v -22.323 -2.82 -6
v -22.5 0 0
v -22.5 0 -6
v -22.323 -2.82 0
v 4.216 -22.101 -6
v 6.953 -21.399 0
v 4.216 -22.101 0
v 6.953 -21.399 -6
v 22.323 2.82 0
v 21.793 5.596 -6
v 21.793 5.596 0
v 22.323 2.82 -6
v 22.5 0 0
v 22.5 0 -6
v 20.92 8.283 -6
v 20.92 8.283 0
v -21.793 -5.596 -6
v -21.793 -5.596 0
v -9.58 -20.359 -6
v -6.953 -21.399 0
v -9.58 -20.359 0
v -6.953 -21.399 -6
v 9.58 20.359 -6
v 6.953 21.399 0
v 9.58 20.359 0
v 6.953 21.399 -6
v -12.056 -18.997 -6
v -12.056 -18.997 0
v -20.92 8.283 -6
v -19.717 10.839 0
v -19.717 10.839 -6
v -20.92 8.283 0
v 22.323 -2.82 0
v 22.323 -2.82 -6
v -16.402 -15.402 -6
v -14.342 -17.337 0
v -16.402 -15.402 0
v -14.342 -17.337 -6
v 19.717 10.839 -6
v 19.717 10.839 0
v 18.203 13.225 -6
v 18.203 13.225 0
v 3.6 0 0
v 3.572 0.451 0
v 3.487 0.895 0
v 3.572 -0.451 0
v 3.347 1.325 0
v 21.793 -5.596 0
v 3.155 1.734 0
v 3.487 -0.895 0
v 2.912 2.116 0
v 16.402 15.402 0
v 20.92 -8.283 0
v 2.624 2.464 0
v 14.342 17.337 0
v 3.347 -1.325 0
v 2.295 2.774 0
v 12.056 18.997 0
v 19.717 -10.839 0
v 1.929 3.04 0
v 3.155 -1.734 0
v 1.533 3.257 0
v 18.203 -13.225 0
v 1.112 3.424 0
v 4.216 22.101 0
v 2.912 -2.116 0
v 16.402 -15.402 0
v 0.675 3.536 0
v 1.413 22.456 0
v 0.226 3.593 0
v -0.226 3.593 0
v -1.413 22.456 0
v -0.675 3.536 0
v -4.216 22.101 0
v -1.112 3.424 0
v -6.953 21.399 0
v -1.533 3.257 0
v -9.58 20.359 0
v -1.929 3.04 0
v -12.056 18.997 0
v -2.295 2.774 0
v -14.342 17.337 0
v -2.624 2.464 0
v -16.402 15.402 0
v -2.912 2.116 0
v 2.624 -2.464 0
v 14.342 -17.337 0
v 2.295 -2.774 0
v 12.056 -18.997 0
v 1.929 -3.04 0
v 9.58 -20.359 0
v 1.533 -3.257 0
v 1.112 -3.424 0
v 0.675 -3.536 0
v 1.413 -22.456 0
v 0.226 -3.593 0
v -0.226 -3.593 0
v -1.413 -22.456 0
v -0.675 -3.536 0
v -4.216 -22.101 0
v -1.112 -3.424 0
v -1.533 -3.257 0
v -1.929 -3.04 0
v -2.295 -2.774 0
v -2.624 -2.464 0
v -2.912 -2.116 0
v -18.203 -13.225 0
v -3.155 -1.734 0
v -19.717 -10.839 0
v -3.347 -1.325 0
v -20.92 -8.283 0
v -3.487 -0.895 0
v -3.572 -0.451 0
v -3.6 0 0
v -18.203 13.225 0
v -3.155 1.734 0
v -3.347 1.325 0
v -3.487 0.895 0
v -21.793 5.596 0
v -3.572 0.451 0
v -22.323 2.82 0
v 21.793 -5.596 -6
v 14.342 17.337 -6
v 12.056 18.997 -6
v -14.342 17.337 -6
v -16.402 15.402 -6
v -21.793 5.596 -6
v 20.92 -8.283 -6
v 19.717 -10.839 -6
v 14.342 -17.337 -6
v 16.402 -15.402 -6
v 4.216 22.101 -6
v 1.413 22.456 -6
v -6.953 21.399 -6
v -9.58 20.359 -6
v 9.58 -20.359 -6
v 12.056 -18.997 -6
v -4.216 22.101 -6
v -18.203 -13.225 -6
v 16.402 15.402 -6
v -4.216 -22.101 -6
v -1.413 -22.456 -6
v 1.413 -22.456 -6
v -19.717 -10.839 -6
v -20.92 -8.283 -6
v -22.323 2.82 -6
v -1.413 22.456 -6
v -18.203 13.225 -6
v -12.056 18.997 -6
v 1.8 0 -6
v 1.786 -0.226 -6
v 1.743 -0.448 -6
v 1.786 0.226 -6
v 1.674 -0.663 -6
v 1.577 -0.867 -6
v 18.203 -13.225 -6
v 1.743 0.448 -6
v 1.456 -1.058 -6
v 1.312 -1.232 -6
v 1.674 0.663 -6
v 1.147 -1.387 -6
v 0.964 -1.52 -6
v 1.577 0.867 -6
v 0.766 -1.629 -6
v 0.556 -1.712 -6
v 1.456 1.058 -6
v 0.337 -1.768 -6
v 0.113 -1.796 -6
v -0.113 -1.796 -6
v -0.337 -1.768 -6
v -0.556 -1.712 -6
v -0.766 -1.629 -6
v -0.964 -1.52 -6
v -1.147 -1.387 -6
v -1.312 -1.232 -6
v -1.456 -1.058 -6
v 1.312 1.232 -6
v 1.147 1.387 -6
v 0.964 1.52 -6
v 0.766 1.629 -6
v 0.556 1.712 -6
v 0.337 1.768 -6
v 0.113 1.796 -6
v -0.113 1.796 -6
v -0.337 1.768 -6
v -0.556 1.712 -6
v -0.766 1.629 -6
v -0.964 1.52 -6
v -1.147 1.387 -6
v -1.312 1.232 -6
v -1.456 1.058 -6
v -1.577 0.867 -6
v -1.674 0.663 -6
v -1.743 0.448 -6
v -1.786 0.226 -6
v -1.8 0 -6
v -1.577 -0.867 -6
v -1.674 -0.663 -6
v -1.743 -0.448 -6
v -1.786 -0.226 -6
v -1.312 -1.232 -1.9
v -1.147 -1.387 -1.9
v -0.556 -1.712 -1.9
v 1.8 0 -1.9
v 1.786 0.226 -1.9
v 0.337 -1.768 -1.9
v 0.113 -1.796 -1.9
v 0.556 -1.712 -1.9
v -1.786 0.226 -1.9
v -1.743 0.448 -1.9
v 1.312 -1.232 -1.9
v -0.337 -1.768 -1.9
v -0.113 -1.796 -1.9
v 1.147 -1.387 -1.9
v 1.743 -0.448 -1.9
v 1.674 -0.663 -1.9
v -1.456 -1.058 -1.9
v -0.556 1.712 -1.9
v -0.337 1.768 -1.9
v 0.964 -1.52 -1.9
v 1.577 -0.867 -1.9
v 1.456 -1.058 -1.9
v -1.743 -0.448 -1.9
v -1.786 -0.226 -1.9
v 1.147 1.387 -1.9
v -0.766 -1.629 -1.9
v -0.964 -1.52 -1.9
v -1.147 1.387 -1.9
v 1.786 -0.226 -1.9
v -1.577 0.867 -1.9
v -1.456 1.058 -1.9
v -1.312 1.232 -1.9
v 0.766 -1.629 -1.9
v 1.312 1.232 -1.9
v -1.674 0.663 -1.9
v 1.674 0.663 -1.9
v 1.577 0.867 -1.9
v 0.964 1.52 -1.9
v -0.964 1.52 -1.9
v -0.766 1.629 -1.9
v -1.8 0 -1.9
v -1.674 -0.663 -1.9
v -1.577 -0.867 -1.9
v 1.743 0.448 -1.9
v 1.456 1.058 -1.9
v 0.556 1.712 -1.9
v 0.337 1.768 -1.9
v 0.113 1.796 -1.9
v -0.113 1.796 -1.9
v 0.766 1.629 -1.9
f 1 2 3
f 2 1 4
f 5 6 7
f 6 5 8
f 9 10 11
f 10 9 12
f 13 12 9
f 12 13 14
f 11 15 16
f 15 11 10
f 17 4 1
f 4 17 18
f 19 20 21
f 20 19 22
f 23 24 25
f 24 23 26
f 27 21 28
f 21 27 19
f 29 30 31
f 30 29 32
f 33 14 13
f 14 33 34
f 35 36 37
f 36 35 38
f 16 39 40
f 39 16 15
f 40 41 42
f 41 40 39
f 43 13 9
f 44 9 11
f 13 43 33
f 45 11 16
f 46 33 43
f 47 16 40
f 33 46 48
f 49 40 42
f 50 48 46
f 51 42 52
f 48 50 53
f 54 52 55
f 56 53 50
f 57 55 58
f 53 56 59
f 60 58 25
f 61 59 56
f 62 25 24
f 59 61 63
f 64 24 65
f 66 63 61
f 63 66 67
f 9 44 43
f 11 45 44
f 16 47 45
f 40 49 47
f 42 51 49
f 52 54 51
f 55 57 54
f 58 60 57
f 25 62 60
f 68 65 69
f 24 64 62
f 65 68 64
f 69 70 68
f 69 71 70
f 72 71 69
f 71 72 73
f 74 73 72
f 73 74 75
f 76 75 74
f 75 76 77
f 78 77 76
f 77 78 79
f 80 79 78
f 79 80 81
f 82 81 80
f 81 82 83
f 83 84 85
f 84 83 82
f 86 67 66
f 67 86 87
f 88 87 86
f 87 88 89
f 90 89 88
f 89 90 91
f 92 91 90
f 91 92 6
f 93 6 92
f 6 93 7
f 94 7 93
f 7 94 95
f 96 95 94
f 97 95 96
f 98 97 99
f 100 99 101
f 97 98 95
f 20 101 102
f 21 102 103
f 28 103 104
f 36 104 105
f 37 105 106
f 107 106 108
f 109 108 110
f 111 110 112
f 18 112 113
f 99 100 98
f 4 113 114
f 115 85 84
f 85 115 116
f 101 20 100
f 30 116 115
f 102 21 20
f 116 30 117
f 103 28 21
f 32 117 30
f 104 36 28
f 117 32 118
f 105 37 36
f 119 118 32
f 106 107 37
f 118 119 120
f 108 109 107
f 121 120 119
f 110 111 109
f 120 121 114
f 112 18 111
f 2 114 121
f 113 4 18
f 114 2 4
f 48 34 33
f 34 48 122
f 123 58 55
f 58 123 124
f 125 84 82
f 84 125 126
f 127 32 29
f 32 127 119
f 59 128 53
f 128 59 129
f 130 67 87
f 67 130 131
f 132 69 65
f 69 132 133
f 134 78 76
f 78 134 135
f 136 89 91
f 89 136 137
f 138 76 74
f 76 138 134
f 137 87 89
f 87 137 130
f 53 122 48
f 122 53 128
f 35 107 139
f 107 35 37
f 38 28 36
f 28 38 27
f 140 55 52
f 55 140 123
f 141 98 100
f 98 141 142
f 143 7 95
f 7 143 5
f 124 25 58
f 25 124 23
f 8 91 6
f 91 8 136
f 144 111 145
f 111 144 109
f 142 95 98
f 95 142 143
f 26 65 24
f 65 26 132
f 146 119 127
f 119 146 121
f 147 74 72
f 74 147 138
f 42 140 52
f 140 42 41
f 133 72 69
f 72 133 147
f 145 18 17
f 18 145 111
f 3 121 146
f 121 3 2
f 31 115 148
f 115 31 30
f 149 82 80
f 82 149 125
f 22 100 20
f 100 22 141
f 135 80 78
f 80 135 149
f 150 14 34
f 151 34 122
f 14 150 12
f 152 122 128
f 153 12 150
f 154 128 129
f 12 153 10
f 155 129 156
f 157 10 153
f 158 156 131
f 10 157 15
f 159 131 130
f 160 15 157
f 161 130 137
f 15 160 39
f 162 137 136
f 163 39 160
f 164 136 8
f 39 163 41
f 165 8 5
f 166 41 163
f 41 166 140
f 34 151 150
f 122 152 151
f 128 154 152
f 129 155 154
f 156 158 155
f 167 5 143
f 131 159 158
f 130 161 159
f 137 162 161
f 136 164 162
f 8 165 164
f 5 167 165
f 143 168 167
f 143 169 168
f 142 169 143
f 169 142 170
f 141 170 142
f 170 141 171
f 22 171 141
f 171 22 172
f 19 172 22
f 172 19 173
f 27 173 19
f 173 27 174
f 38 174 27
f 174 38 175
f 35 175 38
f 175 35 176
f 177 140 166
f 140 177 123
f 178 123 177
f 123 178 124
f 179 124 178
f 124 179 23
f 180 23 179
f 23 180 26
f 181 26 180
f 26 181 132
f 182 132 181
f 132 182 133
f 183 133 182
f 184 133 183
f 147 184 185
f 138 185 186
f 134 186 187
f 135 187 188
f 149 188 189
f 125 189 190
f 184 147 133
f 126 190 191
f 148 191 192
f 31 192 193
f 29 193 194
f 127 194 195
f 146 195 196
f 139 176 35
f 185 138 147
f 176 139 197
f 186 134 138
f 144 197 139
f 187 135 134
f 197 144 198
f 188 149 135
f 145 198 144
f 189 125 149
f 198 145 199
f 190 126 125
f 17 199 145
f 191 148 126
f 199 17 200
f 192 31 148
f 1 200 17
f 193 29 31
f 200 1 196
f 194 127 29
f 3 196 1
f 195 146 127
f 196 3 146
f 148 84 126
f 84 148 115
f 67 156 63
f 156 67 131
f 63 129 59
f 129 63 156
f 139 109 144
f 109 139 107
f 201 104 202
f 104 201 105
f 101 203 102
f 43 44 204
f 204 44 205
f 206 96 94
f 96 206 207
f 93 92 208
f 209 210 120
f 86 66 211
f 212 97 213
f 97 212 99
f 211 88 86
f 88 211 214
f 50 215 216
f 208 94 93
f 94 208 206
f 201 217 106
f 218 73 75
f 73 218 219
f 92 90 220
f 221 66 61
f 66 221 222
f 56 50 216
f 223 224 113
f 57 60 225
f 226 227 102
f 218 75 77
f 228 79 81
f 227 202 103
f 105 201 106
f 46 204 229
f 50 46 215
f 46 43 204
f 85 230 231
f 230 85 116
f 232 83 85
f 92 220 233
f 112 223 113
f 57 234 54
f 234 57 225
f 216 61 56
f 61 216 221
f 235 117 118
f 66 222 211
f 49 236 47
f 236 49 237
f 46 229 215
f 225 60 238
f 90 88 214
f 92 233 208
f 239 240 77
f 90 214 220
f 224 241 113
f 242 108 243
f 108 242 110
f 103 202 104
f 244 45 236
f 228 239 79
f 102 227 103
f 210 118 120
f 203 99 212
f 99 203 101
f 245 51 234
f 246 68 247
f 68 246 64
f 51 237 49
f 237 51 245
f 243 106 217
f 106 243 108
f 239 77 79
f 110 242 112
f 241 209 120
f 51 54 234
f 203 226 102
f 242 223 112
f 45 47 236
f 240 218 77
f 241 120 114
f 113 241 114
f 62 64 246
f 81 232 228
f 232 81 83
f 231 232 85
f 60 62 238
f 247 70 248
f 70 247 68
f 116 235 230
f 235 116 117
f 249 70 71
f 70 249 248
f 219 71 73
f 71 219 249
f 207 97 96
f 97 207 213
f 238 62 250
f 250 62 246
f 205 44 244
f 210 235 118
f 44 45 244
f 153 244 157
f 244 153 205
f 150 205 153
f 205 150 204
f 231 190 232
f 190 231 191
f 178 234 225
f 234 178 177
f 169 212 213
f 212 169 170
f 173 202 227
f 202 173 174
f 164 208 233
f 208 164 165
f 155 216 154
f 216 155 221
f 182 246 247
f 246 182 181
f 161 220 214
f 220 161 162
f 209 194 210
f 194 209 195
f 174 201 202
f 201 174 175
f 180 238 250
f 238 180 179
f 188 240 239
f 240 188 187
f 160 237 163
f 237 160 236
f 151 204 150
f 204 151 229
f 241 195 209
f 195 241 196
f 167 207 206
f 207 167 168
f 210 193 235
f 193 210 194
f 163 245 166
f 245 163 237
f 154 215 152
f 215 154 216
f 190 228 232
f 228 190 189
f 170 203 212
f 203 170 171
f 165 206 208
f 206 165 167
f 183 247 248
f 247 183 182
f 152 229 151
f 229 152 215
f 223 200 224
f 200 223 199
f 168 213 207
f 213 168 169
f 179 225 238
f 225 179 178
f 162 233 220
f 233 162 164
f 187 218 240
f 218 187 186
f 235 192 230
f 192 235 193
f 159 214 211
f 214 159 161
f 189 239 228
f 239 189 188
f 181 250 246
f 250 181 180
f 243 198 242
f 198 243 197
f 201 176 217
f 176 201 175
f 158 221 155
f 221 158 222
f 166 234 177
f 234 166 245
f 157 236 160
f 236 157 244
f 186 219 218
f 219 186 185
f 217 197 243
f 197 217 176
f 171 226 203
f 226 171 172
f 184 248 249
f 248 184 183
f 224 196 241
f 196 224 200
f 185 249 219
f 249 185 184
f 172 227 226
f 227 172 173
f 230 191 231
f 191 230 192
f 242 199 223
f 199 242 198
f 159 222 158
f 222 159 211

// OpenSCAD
$fn = 50;


difference() {
	union() {
		translate(v = [0, 0, -6.0000000000]) {
			cylinder(h = 6, r = 22.5000000000);
		}
		translate(v = [0, 0, -6.0000000000]) {
			cylinder(h = 6, r = 2.8750000000);
		}
	}
	union() {
		translate(v = [0, 0, 0]) {
			rotate(a = [0, 0, 0]) {
				difference() {
					union() {
						translate(v = [0, 0, -6.0000000000]) {
							cylinder(h = 6, r = 1.5000000000);
						}
						translate(v = [0, 0, -1.9000000000]) {
							cylinder(h = 1.9000000000, r1 = 1.8000000000, r2 = 3.6000000000);
						}
						translate(v = [0, 0, -6.0000000000]) {
							cylinder(h = 6, r = 1.8000000000);
						}
						translate(v = [0, 0, -6.0000000000]) {
							cylinder(h = 6, r = 1.5000000000);
						}
					}
					union();
				}
			}
		}
	}
}
